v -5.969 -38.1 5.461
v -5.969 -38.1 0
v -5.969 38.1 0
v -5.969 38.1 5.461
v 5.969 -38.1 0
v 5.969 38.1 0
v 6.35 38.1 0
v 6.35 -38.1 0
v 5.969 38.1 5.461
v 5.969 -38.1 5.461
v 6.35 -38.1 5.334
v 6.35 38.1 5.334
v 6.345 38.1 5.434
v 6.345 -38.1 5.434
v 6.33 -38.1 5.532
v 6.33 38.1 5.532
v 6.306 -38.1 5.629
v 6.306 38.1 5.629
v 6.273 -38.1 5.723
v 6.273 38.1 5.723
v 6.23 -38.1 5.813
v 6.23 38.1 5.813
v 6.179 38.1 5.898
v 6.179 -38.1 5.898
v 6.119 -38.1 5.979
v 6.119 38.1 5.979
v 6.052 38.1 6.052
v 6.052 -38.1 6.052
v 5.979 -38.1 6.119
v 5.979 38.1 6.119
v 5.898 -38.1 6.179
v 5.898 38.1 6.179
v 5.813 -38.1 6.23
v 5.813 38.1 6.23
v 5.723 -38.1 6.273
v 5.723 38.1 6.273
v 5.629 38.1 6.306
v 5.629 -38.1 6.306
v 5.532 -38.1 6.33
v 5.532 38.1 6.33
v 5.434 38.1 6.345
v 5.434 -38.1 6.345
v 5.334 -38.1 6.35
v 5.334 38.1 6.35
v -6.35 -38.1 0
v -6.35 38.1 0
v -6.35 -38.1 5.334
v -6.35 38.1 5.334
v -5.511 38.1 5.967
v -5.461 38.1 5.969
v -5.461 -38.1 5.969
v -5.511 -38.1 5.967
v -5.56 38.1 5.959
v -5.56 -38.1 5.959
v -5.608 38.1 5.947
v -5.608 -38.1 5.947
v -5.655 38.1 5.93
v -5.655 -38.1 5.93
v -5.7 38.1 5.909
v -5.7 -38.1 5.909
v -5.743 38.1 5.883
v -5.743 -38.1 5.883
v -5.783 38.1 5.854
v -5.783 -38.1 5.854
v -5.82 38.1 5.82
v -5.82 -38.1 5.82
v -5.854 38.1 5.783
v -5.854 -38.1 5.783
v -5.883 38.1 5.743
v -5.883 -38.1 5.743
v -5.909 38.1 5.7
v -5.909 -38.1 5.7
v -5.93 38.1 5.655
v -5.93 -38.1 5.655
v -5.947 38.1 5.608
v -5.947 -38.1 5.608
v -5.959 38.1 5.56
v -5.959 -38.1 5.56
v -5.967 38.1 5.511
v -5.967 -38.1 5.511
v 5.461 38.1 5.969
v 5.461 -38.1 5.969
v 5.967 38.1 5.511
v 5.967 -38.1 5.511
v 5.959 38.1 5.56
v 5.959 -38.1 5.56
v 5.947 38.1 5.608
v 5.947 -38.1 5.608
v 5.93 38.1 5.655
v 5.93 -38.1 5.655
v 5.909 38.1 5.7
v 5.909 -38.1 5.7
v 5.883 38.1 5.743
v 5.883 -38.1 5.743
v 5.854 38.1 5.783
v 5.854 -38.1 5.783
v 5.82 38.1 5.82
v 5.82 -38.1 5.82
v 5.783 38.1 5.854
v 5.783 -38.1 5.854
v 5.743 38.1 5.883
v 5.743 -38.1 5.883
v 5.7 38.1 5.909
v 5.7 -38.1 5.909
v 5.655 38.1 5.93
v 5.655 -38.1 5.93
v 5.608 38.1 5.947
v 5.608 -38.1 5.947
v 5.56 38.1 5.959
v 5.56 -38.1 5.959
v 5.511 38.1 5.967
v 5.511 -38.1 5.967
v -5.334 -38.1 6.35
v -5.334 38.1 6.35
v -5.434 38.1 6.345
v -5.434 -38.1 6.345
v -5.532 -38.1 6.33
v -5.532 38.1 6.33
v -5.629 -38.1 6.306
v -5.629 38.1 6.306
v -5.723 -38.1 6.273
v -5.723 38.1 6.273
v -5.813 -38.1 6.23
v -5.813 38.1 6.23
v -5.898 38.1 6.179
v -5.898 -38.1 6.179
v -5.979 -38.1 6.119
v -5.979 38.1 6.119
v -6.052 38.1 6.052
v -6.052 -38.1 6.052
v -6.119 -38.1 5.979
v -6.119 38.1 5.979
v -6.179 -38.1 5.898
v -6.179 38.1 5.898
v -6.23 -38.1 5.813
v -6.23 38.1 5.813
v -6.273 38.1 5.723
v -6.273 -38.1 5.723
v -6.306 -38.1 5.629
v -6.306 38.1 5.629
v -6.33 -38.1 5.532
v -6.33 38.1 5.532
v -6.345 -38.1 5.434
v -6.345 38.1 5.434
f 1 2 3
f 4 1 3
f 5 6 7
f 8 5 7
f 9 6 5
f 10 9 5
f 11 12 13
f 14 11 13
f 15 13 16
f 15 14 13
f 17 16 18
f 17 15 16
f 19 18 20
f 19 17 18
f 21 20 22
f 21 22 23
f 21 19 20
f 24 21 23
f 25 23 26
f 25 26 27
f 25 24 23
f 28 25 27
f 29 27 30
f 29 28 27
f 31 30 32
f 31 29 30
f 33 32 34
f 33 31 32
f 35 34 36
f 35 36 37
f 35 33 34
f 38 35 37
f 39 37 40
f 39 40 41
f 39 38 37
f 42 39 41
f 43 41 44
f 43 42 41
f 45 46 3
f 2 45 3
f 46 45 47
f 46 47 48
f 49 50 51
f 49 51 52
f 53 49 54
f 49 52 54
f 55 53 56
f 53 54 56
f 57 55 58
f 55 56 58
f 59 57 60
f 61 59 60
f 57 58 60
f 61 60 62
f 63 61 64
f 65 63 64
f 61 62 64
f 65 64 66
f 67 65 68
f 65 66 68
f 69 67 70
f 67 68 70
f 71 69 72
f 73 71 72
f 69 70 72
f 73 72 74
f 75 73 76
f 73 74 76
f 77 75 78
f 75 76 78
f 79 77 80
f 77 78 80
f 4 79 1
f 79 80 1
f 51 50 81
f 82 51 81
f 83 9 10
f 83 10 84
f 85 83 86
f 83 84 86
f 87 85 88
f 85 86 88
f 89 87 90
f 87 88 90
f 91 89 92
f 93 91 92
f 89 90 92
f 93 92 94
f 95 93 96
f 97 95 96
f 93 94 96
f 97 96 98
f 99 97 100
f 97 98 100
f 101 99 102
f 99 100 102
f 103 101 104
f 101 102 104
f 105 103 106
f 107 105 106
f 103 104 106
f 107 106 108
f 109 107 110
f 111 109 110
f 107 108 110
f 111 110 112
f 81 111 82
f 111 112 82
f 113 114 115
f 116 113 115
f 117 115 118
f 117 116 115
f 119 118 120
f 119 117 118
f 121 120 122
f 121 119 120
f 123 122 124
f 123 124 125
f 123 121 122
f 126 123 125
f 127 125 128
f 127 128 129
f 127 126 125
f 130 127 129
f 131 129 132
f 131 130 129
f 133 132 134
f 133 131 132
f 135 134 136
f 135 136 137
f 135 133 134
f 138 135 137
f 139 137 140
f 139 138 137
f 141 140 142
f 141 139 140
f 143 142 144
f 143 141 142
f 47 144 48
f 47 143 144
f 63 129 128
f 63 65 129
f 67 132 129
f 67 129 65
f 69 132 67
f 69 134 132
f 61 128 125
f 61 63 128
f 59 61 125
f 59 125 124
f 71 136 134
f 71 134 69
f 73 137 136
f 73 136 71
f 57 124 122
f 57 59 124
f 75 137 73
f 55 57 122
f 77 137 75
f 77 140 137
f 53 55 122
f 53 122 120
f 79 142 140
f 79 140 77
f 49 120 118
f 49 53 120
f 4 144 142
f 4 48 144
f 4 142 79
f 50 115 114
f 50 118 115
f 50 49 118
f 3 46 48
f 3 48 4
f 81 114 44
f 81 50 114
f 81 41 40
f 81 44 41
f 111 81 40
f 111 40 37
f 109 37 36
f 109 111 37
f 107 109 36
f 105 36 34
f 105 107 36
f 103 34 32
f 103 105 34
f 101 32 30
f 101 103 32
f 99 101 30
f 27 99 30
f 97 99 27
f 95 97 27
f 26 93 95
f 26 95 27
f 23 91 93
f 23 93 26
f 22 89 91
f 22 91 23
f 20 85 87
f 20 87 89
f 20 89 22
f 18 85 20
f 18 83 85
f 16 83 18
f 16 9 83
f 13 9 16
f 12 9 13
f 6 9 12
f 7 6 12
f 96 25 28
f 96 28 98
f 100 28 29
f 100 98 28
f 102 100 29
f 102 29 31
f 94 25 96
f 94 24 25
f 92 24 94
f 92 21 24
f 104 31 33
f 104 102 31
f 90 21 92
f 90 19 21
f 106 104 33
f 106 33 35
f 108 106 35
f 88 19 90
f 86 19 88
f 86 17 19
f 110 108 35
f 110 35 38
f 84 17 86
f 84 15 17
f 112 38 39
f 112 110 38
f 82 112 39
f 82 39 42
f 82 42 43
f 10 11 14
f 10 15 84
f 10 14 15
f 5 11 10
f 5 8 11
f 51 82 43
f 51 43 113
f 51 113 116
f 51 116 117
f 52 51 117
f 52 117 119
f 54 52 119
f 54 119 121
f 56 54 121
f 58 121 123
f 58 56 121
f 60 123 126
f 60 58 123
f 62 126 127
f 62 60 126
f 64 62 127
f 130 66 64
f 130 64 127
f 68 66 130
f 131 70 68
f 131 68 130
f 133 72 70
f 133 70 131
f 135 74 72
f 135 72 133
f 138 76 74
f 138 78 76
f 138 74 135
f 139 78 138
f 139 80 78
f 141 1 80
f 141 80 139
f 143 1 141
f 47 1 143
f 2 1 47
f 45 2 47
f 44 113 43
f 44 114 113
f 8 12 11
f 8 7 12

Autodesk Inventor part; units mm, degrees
ref_plane "YZ Plane" through (0, 0, 0) normal (1, 0, 0) x (0, 1, 0)
ref_plane "XZ Plane" through (0, 0, 0) normal (0, 1, 0) x (-1, 0, 0)
ref_plane "XY Plane" through (0, 0, 0) normal (0, 0, 1) x (1, 0, 0)
sketch "Sketch1" plane through (0, 0, 0) normal (0, 0, 1) x (1, 0, 0)
  line L0 (0, 53.34) -> (0, -53.34) projected
  line L1 (-8.89, 0) -> (8.89, 0) projected
  line L2 (-6.35, 38.1) -> (6.35, 38.1)
  line L3 (6.35, 38.1) -> (6.35, -38.1)
  line L4 (6.35, -38.1) -> (-6.35, -38.1)
  line L5 (-6.35, -38.1) -> (-6.35, 38.1)
  dimension "d0" = 12.7
  dimension "d1" = 76.2
extrude "Extrusion1" add sketch "Sketch1" along normal blind 6.35
shell "Shell1" thickness 0.381 removed faces 3 at (2.1167, -38.1, 2.1167) at (2.1167, -12.7, 0) at (-2.1167, 38.1, 2.1167)
fillet "Fillet1" radius 0.508 2 edges at (-5.969, 0, 5.969) (5.969, 0, 5.969)
fillet "Fillet1" radius 1.016 2 edges at (-6.35, 0, 6.35) (6.35, 0, 6.35)
properties part number "Staples" material "Steel, Mild"
